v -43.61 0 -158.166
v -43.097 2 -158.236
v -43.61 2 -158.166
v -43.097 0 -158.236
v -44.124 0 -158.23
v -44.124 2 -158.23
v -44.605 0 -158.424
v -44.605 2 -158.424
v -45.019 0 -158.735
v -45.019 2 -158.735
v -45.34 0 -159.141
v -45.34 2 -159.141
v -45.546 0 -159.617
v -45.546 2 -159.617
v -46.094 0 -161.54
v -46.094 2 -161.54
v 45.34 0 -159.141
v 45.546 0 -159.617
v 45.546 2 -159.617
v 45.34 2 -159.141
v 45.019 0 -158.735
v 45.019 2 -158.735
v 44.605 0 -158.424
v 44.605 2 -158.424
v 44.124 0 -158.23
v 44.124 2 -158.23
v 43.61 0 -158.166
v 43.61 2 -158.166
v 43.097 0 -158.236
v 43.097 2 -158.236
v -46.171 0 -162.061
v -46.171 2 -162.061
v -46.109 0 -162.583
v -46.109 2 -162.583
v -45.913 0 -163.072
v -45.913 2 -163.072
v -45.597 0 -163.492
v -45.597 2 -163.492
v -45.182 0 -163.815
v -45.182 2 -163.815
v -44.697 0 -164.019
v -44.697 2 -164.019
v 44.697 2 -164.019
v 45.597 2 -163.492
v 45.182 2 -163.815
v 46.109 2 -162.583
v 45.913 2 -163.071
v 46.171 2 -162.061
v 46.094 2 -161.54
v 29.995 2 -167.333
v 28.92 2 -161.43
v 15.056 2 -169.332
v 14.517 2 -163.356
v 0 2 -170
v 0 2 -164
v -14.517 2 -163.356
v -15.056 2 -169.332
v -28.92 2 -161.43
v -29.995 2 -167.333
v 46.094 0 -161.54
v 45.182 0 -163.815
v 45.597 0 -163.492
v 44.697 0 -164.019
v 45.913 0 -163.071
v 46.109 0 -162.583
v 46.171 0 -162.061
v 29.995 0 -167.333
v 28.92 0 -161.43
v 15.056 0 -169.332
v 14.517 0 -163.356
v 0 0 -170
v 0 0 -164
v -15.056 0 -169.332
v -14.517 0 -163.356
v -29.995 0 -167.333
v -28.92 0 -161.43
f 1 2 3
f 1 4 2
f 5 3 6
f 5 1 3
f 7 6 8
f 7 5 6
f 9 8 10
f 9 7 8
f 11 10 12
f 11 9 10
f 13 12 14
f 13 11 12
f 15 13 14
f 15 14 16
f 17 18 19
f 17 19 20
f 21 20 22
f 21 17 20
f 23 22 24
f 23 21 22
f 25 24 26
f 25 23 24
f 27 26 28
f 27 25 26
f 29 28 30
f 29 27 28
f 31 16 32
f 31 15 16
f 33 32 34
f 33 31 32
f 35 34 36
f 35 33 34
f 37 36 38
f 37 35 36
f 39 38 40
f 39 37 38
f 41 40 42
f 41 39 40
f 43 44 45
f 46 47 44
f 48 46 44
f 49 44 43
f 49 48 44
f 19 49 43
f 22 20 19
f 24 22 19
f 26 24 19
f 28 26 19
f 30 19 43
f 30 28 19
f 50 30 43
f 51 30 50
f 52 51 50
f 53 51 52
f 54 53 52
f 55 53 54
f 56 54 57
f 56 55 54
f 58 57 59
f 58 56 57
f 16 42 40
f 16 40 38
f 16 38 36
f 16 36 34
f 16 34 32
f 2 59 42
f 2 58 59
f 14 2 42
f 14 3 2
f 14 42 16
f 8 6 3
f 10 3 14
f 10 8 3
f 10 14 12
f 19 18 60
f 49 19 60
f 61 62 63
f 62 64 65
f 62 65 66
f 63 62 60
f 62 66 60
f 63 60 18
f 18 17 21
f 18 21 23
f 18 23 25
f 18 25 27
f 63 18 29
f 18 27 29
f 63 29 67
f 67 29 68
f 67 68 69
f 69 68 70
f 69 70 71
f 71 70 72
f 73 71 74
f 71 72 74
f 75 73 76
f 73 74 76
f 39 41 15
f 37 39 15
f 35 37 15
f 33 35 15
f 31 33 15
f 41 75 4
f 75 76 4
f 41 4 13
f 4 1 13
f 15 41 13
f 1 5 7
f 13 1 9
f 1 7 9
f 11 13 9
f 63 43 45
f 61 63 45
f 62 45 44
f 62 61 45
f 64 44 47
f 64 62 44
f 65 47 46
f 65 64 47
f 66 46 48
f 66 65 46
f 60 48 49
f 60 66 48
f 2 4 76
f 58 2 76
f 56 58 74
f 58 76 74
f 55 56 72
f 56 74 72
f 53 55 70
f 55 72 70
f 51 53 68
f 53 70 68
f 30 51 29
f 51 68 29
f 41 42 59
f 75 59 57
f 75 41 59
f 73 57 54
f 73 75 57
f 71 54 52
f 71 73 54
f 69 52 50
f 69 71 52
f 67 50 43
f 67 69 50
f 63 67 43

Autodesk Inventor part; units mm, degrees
ref_plane "YZ Plane" through (0, 0, 0) normal (1, 0, 0) x (0, 1, 0)
ref_plane "XZ Plane" through (0, 0, 0) normal (0, 1, 0) x (-1, 0, 0)
ref_plane "XY Plane" through (0, 0, 0) normal (0, 0, 1) x (1, 0, 0)
sketch "スケッチ1" plane through (0, 0, 0) normal (0, 1, 0) x (-1, 0, 0)
  arc A0 (-44.6969, -164.0189) -> (44.6969, -164.0189) centre (0, 0) ccw
  arc A1 (-43.0967, -158.2361) -> (43.0967, -158.2361) centre (0, 0) ccw
  line L0 (45.5455, -159.6171) -> (46.0943, -161.5404)
  line L1 (-45.5455, -159.6171) -> (-46.0943, -161.5404)
  arc A2 (44.6969, -164.0189) -> (46.0943, -161.5404) centre (44.1711, -162.0892) ccw
  arc A3 (45.5455, -159.6171) -> (43.0967, -158.2361) centre (43.6222, -160.1659) ccw
  arc A4 (-43.0967, -158.2361) -> (-45.5455, -159.6171) centre (-43.6222, -160.1659) ccw
  arc A5 (-46.0943, -161.5404) -> (-44.6969, -164.0189) centre (-44.1711, -162.0892) ccw
  line L2 (0, -204) -> (0, 34) projected
  point P0 (-46.6463, -163.4751)
  point P1 (46.6463, -163.4751)
  point P2 (-45, -157.7054)
  point P3 (45, -157.7054)
  point P4 (-46.6463, -163.4751)
  dimension "d0" = 170
  dimension "d1" = 6
  dimension "d2" = 2
  dimension "d3" = 90
extrude "押し出し1" add sketch "スケッチ1" along normal blind 2
properties part number "SubHandle"
